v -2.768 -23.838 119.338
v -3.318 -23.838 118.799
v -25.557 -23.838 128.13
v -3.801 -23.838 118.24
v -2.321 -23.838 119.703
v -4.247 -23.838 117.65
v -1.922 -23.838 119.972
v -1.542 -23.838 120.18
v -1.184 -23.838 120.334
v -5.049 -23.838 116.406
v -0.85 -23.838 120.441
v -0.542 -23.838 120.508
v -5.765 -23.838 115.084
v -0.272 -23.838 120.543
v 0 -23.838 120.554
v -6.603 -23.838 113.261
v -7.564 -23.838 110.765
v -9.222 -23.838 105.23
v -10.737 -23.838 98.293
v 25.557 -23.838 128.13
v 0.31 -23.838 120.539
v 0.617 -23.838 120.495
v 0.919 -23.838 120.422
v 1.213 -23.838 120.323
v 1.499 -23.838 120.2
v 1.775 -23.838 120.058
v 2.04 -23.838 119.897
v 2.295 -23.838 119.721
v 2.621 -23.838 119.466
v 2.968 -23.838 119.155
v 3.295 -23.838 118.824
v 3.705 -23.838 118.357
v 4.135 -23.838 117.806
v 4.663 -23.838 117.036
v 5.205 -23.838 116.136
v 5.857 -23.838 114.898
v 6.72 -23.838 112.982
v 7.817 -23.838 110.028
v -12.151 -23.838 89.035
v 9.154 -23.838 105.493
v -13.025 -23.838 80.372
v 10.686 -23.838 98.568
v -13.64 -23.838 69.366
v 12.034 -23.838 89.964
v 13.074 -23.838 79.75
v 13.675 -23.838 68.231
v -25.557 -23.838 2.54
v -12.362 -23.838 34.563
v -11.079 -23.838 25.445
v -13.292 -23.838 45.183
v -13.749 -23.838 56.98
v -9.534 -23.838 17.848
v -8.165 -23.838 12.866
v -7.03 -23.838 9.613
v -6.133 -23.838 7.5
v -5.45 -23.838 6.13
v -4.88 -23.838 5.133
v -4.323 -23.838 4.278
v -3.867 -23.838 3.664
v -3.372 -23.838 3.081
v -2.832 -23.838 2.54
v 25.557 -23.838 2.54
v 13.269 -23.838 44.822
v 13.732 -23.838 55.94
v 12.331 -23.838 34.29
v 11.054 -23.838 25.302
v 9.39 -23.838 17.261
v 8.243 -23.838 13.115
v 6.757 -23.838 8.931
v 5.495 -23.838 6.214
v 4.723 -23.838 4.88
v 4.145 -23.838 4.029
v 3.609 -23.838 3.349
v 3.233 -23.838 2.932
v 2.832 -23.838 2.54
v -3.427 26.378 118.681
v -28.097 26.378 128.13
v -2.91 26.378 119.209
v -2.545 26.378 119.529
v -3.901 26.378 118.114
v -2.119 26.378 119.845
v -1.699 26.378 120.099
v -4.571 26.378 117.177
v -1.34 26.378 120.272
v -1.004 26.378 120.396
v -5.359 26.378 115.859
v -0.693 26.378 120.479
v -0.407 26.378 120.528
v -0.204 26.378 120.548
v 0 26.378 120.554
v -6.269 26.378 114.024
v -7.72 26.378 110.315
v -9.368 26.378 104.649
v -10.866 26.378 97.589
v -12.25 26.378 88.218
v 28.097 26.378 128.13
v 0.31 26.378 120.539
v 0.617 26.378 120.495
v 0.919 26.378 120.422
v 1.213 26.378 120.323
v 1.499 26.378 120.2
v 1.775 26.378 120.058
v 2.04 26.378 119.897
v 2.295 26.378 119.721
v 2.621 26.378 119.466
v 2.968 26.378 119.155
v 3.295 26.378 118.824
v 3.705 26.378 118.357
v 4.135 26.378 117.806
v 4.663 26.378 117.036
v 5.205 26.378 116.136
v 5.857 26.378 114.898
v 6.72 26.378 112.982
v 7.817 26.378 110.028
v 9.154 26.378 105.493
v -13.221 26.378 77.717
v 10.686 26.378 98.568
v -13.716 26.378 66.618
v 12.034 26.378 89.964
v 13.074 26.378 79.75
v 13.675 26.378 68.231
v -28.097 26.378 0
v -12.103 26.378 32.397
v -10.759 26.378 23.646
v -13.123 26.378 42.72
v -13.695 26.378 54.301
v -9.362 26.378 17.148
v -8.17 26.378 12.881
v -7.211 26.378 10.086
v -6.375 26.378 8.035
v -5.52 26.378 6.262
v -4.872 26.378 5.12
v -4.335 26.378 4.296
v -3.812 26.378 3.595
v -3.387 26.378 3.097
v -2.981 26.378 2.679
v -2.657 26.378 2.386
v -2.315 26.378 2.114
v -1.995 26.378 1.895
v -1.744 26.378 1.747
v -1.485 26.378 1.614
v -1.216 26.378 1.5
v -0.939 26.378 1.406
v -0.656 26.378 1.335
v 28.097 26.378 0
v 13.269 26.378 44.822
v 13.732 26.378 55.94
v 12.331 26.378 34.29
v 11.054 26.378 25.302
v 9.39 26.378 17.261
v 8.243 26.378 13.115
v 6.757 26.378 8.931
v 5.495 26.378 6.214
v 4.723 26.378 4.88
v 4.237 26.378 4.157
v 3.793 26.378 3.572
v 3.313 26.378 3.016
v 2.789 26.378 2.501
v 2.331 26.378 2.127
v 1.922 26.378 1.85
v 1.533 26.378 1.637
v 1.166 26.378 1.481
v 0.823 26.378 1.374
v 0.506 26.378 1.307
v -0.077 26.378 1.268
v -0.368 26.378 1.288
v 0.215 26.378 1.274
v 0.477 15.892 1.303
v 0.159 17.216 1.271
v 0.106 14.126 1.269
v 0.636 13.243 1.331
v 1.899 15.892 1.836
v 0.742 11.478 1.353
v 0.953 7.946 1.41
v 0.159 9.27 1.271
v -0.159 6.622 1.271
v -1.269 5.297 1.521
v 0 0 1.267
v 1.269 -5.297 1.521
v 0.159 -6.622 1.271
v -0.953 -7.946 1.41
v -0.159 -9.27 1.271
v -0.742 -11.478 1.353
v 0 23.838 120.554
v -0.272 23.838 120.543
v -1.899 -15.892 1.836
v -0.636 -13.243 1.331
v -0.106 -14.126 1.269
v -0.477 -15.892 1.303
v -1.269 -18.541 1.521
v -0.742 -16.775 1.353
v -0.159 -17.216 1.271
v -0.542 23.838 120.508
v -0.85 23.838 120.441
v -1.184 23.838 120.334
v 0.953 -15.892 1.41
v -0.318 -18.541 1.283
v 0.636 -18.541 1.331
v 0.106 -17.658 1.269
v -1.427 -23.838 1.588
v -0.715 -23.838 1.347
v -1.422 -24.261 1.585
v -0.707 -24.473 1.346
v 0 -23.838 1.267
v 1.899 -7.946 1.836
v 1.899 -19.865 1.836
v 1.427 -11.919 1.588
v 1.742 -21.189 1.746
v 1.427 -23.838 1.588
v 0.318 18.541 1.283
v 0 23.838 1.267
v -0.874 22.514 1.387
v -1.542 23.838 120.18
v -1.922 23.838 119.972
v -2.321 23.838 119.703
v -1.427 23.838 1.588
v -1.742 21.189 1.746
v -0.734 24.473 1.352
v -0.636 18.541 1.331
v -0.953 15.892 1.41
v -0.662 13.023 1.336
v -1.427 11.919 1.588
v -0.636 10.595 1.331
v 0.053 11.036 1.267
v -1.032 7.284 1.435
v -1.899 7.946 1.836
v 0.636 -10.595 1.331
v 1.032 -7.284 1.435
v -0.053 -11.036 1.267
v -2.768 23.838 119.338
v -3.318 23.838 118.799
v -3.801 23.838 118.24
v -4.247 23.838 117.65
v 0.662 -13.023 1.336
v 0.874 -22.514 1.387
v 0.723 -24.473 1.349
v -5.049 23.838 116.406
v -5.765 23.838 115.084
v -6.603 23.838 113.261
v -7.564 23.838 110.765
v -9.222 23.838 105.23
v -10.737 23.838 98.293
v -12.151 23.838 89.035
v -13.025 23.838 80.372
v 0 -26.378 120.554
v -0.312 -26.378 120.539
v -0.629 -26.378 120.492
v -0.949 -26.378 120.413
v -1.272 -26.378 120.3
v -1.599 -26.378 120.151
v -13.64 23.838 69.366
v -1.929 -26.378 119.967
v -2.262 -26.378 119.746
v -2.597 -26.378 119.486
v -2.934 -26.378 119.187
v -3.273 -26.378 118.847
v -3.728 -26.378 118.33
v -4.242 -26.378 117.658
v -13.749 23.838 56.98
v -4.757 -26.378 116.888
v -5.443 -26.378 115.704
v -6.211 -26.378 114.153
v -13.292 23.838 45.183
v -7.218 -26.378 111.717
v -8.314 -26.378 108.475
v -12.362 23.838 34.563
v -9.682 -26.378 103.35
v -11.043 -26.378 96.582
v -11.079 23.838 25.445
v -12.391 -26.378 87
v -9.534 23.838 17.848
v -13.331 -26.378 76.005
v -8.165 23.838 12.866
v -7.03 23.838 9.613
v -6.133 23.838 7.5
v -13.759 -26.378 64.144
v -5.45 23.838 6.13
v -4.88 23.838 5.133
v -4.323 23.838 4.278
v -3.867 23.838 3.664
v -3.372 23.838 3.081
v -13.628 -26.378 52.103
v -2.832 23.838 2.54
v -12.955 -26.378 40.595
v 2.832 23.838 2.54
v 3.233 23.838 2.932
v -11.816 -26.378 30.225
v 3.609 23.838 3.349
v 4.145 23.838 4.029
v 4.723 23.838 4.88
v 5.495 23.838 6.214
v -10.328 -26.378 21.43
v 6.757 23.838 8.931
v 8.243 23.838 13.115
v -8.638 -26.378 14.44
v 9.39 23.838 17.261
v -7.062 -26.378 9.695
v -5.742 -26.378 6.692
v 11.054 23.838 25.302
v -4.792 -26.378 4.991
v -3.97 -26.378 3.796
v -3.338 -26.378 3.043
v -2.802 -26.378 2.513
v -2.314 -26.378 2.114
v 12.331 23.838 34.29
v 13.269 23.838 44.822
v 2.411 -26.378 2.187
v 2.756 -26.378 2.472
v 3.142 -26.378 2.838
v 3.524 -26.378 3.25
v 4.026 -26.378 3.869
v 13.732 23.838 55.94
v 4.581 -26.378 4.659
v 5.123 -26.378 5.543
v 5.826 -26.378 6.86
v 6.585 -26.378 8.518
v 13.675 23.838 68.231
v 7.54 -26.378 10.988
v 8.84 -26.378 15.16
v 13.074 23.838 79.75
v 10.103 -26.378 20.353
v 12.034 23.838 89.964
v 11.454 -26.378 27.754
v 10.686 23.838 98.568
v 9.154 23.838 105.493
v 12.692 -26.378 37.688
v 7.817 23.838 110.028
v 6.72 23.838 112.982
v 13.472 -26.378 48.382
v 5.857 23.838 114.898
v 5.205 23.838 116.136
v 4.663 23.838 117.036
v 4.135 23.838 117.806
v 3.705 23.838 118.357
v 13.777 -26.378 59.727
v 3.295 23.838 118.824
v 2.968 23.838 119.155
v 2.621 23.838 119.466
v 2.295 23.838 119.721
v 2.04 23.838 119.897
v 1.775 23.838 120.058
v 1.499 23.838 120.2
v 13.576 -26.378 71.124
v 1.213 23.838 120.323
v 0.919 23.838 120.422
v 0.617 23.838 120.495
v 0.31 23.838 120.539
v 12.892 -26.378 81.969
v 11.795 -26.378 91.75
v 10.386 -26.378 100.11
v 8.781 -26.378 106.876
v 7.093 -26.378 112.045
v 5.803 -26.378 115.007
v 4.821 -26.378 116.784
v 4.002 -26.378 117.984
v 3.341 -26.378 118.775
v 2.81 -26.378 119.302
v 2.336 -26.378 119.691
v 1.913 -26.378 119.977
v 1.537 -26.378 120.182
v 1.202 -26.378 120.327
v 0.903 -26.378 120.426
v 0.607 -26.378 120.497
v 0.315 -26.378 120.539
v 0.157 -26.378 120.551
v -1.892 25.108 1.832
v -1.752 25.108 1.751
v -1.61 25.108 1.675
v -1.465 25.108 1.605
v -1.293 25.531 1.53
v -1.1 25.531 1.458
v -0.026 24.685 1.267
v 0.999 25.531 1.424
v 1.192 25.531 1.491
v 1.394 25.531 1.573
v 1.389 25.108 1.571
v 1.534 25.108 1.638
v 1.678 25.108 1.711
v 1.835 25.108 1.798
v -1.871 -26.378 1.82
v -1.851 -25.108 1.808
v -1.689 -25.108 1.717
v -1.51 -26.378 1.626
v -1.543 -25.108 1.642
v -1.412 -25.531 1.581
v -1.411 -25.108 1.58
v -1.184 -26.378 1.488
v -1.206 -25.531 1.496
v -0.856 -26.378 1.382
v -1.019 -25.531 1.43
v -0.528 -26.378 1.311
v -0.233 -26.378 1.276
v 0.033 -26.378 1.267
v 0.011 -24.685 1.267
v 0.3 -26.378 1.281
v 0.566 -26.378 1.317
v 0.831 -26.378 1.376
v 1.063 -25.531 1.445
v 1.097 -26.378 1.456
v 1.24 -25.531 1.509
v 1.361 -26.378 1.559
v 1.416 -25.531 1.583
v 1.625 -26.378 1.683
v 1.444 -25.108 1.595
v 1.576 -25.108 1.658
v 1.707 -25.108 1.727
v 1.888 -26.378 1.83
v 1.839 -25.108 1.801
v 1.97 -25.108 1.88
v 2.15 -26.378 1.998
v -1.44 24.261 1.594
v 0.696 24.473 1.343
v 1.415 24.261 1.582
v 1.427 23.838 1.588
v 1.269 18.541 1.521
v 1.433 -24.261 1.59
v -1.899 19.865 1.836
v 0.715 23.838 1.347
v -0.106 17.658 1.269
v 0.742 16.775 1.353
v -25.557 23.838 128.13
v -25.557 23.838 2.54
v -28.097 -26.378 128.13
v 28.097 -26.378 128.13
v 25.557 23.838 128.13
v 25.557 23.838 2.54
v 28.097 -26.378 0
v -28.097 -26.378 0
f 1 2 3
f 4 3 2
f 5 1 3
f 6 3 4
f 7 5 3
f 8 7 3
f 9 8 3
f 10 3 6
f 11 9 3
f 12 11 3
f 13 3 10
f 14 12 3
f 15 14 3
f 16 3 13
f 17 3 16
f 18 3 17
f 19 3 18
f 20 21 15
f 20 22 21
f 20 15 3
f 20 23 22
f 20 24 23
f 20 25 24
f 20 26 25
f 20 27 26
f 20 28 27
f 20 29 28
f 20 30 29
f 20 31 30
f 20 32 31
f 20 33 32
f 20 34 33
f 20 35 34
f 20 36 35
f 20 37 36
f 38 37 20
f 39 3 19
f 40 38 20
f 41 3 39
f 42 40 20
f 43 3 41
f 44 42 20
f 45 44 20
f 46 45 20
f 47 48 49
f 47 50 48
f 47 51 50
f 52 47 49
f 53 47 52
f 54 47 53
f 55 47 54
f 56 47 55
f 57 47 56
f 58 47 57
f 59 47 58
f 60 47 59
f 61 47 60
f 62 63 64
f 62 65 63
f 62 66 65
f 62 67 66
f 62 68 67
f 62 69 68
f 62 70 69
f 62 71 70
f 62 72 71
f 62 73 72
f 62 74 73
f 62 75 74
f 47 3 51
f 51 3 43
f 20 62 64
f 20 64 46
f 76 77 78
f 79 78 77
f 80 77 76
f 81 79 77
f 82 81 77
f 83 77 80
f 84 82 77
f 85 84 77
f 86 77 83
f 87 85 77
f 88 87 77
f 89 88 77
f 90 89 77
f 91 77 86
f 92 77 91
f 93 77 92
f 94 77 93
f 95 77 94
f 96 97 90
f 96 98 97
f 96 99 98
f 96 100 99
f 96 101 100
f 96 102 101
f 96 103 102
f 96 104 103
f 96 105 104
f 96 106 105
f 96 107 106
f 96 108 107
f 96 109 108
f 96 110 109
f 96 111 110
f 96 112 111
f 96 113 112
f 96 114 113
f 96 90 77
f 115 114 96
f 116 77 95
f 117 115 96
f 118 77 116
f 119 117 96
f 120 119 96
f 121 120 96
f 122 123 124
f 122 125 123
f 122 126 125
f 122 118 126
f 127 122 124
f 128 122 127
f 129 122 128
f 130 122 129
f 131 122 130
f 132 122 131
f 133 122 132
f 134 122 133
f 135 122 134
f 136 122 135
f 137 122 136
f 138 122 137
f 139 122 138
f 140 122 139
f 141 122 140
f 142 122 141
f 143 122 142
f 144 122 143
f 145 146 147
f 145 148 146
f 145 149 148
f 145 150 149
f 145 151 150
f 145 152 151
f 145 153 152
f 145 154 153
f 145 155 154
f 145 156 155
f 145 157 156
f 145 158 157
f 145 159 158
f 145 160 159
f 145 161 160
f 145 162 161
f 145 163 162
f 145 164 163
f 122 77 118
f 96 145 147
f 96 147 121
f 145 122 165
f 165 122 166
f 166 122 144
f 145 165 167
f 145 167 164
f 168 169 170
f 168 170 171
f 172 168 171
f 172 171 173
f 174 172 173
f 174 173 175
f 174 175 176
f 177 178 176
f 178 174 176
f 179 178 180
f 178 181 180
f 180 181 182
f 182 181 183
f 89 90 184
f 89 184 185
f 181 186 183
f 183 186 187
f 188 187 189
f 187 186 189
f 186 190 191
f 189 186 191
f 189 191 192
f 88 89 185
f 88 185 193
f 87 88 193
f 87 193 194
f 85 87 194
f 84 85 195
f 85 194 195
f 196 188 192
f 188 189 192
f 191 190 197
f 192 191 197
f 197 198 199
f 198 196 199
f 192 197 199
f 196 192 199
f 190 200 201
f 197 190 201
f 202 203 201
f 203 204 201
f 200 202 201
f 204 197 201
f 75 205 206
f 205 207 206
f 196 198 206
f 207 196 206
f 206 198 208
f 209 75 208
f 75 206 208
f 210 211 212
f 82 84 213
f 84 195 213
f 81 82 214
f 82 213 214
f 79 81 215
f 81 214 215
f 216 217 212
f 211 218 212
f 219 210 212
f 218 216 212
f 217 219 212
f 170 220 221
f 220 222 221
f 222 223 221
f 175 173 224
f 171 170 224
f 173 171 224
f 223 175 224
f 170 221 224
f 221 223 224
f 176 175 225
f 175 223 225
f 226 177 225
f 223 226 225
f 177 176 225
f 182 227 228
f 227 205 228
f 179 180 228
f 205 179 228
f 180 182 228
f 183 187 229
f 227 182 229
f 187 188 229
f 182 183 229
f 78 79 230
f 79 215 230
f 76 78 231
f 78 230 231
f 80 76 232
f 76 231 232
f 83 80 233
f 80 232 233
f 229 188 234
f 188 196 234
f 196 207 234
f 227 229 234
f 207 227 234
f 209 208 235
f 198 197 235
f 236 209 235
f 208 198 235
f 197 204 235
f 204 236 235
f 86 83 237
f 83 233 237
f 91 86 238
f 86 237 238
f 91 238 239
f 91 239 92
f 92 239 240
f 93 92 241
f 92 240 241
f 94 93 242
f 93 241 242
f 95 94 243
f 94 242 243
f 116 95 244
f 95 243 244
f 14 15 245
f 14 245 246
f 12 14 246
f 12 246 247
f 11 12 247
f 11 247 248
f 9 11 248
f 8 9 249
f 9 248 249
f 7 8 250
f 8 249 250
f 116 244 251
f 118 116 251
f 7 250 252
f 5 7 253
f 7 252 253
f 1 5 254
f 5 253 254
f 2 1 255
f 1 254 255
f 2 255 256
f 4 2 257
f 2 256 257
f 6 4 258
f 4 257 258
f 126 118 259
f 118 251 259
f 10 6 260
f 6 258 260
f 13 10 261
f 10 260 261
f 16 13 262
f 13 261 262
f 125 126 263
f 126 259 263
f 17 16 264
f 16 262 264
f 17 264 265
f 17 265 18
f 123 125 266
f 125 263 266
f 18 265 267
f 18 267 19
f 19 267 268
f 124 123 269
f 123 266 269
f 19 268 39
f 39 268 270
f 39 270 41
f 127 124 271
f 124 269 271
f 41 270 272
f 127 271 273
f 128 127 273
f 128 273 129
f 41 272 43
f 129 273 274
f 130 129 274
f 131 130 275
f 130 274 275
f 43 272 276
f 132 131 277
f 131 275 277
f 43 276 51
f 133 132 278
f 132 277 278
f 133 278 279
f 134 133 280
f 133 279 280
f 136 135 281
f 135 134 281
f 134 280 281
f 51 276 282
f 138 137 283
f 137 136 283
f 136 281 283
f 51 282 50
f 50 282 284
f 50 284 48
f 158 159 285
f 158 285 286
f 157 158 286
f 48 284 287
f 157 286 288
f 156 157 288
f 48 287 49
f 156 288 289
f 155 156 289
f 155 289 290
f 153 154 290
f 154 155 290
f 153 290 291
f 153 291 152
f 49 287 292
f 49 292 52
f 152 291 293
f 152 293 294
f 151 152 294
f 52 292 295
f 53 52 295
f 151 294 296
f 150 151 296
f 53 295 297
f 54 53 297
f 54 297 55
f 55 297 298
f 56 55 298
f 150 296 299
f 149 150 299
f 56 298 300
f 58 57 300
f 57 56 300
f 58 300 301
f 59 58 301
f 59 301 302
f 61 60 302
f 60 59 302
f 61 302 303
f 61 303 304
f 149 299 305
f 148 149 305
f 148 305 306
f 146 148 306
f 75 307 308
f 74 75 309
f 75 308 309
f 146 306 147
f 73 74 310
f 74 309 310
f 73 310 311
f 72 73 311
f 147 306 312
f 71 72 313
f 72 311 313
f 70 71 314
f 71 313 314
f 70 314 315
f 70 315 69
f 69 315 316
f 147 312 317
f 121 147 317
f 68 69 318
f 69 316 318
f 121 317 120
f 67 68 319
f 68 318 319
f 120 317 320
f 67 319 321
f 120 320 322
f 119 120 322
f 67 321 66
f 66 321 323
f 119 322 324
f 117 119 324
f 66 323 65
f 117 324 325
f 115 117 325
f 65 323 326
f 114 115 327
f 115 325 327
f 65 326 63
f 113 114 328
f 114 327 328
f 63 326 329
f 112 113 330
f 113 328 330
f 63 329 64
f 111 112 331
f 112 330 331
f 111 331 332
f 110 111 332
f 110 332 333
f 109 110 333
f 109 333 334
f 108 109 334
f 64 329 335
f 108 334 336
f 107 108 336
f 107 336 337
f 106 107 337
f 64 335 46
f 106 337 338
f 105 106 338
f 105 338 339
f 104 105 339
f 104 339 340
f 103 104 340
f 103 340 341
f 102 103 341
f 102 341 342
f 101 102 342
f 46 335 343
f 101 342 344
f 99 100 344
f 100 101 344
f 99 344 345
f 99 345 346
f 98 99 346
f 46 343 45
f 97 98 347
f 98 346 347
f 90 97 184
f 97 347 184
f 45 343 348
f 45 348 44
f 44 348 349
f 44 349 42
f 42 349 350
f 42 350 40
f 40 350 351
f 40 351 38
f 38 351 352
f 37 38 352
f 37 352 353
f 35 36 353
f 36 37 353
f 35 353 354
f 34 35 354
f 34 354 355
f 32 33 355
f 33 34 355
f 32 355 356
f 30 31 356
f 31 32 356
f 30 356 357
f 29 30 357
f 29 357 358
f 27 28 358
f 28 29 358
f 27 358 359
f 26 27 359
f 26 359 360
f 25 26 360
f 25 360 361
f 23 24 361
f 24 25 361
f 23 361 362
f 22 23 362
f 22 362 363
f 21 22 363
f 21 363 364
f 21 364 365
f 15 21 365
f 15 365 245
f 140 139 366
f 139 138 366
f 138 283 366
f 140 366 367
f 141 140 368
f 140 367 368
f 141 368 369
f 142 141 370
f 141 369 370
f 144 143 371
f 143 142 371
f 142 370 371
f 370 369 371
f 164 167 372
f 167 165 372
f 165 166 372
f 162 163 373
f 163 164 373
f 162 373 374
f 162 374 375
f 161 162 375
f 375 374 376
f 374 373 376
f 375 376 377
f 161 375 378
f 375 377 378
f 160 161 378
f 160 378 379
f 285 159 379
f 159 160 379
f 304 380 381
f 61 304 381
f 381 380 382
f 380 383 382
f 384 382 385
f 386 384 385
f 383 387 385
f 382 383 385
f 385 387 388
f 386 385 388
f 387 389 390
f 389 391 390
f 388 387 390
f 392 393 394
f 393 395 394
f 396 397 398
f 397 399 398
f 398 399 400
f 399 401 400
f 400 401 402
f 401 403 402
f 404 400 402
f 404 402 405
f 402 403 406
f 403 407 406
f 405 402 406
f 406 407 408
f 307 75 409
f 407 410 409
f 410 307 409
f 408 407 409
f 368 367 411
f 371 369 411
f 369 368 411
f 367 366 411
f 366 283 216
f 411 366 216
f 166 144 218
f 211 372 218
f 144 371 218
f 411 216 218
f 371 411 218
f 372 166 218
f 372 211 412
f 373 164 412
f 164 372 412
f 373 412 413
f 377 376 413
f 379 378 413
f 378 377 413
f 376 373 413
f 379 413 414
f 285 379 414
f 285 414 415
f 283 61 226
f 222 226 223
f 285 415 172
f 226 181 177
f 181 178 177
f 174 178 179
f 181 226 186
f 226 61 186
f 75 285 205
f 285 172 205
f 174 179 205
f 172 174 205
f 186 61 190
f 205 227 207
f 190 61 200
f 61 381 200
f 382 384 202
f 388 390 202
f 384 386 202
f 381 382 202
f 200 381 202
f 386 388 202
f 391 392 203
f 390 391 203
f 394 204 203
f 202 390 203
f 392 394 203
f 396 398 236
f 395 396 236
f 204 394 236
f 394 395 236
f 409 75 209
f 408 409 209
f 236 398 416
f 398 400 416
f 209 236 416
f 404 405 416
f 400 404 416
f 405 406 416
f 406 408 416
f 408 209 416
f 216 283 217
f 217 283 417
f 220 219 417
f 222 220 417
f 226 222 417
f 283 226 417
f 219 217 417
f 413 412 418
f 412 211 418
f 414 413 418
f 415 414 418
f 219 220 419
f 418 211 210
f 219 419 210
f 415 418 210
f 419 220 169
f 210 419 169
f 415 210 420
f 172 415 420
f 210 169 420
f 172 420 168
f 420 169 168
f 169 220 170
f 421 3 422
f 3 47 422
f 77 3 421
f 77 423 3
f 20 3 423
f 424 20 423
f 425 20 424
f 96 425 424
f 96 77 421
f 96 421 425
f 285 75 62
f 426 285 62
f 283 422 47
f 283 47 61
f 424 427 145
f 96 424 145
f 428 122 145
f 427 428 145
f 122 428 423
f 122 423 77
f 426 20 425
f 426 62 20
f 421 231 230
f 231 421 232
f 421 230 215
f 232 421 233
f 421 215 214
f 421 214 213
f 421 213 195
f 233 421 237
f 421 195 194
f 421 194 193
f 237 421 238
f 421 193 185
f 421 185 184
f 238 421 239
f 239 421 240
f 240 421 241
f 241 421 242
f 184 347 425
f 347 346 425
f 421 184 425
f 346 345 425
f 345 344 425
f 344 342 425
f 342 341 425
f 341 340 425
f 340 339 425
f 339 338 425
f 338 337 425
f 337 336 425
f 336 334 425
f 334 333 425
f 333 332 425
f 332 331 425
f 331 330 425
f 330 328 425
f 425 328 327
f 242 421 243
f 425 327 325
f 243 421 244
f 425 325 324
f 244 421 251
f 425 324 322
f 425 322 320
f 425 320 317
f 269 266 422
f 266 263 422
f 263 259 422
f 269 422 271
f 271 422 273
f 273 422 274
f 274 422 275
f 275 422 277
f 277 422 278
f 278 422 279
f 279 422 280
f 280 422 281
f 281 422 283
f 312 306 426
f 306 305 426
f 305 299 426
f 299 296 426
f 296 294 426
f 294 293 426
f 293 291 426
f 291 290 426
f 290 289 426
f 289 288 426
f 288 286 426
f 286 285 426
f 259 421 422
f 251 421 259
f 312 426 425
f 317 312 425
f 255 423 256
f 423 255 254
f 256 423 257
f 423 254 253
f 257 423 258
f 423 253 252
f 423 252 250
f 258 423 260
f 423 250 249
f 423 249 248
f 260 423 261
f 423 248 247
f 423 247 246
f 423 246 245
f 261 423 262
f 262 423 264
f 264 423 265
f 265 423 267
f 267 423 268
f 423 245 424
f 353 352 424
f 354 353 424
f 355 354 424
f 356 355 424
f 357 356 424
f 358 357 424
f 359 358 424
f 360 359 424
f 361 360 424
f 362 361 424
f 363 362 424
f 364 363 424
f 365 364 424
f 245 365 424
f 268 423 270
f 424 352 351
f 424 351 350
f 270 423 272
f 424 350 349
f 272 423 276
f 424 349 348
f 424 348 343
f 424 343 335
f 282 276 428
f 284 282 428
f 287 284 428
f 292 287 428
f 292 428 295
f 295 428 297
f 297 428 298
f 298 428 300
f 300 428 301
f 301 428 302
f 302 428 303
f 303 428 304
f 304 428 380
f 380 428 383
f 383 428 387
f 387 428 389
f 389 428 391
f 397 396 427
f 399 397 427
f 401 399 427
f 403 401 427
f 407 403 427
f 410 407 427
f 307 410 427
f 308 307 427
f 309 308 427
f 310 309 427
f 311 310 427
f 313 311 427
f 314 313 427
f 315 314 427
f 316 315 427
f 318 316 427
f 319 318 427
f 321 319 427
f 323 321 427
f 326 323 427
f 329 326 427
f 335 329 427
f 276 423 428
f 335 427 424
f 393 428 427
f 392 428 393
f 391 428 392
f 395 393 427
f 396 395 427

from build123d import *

# Parameters (mm, degrees)
F0_W     = 56.1930239201
F0_H     = 52.7560710907
F1_DEPTH = 128.1304806471
F2_T     = -2.54
F4_DEPTH = 87.9370719194
F5_DEPTH = 25.4
F6_DEPTH = 25.4


with BuildPart() as f1:
    # F0 (on Top) → F1 (new body)
    with BuildSketch(Plane.XY):
        Rectangle(F0_W, F0_H)
    extrude(amount=F1_DEPTH)

    # F2
    f2_openings = [f1.faces().sort_by_distance(p)[0] for p in [
        (0, 0, 128.130481),
    ]]
    offset(amount=F2_T, openings=f2_openings)

    # F3 (on face) → F4 (cut)
    with BuildSketch(Plane.XZ.offset(26.3780355453)):
        with BuildLine():
            add(Edge.make_bspline(
                [(0, 120.5544546247), (-23.8667058273, 120.5544546247), (-11.9333529136, 31.0888923705), (0, -58.3766698837), (11.9333529136, 31.0888923705), (23.8667058273, 120.5544546247), (0, 120.5544546247)],
                knots=[0, 0, 0, 2.0943951024, 2.0943951024, 4.1887902048, 4.1887902048, 6.2831853072, 6.2831853072, 6.2831853072], degree=2, weights=[1, 0.5, 1, 0.5, 1, 0.5, 1]))
        make_face()
    extrude(amount=-F4_DEPTH, mode=Mode.SUBTRACT)


with BuildPart() as f5:
    # F3 (on face) → F5 (new body)
    with BuildSketch(Plane.XZ.offset(26.3780355453)):
        with BuildLine():
            add(Edge.make_bspline(
                [(0, 120.5544546247), (-23.8667058273, 120.5544546247), (-11.9333529136, 31.0888923705), (0, -58.3766698837), (11.9333529136, 31.0888923705), (23.8667058273, 120.5544546247), (0, 120.5544546247)],
                knots=[0, 0, 0, 2.0943951024, 2.0943951024, 4.1887902048, 4.1887902048, 6.2831853072, 6.2831853072, 6.2831853072], degree=2, weights=[1, 0.5, 1, 0.5, 1, 0.5, 1]))
        make_face()
    extrude(amount=F5_DEPTH)

    # F6 (cut): a face of the model
    f6_faces = [f5.faces().sort_by_distance(p)[0] for p in [
        (0, -51.7780355453, 60.7660799004),
    ]]
    extrude(f6_faces, amount=-F6_DEPTH, mode=Mode.SUBTRACT)


solid = f1.part
